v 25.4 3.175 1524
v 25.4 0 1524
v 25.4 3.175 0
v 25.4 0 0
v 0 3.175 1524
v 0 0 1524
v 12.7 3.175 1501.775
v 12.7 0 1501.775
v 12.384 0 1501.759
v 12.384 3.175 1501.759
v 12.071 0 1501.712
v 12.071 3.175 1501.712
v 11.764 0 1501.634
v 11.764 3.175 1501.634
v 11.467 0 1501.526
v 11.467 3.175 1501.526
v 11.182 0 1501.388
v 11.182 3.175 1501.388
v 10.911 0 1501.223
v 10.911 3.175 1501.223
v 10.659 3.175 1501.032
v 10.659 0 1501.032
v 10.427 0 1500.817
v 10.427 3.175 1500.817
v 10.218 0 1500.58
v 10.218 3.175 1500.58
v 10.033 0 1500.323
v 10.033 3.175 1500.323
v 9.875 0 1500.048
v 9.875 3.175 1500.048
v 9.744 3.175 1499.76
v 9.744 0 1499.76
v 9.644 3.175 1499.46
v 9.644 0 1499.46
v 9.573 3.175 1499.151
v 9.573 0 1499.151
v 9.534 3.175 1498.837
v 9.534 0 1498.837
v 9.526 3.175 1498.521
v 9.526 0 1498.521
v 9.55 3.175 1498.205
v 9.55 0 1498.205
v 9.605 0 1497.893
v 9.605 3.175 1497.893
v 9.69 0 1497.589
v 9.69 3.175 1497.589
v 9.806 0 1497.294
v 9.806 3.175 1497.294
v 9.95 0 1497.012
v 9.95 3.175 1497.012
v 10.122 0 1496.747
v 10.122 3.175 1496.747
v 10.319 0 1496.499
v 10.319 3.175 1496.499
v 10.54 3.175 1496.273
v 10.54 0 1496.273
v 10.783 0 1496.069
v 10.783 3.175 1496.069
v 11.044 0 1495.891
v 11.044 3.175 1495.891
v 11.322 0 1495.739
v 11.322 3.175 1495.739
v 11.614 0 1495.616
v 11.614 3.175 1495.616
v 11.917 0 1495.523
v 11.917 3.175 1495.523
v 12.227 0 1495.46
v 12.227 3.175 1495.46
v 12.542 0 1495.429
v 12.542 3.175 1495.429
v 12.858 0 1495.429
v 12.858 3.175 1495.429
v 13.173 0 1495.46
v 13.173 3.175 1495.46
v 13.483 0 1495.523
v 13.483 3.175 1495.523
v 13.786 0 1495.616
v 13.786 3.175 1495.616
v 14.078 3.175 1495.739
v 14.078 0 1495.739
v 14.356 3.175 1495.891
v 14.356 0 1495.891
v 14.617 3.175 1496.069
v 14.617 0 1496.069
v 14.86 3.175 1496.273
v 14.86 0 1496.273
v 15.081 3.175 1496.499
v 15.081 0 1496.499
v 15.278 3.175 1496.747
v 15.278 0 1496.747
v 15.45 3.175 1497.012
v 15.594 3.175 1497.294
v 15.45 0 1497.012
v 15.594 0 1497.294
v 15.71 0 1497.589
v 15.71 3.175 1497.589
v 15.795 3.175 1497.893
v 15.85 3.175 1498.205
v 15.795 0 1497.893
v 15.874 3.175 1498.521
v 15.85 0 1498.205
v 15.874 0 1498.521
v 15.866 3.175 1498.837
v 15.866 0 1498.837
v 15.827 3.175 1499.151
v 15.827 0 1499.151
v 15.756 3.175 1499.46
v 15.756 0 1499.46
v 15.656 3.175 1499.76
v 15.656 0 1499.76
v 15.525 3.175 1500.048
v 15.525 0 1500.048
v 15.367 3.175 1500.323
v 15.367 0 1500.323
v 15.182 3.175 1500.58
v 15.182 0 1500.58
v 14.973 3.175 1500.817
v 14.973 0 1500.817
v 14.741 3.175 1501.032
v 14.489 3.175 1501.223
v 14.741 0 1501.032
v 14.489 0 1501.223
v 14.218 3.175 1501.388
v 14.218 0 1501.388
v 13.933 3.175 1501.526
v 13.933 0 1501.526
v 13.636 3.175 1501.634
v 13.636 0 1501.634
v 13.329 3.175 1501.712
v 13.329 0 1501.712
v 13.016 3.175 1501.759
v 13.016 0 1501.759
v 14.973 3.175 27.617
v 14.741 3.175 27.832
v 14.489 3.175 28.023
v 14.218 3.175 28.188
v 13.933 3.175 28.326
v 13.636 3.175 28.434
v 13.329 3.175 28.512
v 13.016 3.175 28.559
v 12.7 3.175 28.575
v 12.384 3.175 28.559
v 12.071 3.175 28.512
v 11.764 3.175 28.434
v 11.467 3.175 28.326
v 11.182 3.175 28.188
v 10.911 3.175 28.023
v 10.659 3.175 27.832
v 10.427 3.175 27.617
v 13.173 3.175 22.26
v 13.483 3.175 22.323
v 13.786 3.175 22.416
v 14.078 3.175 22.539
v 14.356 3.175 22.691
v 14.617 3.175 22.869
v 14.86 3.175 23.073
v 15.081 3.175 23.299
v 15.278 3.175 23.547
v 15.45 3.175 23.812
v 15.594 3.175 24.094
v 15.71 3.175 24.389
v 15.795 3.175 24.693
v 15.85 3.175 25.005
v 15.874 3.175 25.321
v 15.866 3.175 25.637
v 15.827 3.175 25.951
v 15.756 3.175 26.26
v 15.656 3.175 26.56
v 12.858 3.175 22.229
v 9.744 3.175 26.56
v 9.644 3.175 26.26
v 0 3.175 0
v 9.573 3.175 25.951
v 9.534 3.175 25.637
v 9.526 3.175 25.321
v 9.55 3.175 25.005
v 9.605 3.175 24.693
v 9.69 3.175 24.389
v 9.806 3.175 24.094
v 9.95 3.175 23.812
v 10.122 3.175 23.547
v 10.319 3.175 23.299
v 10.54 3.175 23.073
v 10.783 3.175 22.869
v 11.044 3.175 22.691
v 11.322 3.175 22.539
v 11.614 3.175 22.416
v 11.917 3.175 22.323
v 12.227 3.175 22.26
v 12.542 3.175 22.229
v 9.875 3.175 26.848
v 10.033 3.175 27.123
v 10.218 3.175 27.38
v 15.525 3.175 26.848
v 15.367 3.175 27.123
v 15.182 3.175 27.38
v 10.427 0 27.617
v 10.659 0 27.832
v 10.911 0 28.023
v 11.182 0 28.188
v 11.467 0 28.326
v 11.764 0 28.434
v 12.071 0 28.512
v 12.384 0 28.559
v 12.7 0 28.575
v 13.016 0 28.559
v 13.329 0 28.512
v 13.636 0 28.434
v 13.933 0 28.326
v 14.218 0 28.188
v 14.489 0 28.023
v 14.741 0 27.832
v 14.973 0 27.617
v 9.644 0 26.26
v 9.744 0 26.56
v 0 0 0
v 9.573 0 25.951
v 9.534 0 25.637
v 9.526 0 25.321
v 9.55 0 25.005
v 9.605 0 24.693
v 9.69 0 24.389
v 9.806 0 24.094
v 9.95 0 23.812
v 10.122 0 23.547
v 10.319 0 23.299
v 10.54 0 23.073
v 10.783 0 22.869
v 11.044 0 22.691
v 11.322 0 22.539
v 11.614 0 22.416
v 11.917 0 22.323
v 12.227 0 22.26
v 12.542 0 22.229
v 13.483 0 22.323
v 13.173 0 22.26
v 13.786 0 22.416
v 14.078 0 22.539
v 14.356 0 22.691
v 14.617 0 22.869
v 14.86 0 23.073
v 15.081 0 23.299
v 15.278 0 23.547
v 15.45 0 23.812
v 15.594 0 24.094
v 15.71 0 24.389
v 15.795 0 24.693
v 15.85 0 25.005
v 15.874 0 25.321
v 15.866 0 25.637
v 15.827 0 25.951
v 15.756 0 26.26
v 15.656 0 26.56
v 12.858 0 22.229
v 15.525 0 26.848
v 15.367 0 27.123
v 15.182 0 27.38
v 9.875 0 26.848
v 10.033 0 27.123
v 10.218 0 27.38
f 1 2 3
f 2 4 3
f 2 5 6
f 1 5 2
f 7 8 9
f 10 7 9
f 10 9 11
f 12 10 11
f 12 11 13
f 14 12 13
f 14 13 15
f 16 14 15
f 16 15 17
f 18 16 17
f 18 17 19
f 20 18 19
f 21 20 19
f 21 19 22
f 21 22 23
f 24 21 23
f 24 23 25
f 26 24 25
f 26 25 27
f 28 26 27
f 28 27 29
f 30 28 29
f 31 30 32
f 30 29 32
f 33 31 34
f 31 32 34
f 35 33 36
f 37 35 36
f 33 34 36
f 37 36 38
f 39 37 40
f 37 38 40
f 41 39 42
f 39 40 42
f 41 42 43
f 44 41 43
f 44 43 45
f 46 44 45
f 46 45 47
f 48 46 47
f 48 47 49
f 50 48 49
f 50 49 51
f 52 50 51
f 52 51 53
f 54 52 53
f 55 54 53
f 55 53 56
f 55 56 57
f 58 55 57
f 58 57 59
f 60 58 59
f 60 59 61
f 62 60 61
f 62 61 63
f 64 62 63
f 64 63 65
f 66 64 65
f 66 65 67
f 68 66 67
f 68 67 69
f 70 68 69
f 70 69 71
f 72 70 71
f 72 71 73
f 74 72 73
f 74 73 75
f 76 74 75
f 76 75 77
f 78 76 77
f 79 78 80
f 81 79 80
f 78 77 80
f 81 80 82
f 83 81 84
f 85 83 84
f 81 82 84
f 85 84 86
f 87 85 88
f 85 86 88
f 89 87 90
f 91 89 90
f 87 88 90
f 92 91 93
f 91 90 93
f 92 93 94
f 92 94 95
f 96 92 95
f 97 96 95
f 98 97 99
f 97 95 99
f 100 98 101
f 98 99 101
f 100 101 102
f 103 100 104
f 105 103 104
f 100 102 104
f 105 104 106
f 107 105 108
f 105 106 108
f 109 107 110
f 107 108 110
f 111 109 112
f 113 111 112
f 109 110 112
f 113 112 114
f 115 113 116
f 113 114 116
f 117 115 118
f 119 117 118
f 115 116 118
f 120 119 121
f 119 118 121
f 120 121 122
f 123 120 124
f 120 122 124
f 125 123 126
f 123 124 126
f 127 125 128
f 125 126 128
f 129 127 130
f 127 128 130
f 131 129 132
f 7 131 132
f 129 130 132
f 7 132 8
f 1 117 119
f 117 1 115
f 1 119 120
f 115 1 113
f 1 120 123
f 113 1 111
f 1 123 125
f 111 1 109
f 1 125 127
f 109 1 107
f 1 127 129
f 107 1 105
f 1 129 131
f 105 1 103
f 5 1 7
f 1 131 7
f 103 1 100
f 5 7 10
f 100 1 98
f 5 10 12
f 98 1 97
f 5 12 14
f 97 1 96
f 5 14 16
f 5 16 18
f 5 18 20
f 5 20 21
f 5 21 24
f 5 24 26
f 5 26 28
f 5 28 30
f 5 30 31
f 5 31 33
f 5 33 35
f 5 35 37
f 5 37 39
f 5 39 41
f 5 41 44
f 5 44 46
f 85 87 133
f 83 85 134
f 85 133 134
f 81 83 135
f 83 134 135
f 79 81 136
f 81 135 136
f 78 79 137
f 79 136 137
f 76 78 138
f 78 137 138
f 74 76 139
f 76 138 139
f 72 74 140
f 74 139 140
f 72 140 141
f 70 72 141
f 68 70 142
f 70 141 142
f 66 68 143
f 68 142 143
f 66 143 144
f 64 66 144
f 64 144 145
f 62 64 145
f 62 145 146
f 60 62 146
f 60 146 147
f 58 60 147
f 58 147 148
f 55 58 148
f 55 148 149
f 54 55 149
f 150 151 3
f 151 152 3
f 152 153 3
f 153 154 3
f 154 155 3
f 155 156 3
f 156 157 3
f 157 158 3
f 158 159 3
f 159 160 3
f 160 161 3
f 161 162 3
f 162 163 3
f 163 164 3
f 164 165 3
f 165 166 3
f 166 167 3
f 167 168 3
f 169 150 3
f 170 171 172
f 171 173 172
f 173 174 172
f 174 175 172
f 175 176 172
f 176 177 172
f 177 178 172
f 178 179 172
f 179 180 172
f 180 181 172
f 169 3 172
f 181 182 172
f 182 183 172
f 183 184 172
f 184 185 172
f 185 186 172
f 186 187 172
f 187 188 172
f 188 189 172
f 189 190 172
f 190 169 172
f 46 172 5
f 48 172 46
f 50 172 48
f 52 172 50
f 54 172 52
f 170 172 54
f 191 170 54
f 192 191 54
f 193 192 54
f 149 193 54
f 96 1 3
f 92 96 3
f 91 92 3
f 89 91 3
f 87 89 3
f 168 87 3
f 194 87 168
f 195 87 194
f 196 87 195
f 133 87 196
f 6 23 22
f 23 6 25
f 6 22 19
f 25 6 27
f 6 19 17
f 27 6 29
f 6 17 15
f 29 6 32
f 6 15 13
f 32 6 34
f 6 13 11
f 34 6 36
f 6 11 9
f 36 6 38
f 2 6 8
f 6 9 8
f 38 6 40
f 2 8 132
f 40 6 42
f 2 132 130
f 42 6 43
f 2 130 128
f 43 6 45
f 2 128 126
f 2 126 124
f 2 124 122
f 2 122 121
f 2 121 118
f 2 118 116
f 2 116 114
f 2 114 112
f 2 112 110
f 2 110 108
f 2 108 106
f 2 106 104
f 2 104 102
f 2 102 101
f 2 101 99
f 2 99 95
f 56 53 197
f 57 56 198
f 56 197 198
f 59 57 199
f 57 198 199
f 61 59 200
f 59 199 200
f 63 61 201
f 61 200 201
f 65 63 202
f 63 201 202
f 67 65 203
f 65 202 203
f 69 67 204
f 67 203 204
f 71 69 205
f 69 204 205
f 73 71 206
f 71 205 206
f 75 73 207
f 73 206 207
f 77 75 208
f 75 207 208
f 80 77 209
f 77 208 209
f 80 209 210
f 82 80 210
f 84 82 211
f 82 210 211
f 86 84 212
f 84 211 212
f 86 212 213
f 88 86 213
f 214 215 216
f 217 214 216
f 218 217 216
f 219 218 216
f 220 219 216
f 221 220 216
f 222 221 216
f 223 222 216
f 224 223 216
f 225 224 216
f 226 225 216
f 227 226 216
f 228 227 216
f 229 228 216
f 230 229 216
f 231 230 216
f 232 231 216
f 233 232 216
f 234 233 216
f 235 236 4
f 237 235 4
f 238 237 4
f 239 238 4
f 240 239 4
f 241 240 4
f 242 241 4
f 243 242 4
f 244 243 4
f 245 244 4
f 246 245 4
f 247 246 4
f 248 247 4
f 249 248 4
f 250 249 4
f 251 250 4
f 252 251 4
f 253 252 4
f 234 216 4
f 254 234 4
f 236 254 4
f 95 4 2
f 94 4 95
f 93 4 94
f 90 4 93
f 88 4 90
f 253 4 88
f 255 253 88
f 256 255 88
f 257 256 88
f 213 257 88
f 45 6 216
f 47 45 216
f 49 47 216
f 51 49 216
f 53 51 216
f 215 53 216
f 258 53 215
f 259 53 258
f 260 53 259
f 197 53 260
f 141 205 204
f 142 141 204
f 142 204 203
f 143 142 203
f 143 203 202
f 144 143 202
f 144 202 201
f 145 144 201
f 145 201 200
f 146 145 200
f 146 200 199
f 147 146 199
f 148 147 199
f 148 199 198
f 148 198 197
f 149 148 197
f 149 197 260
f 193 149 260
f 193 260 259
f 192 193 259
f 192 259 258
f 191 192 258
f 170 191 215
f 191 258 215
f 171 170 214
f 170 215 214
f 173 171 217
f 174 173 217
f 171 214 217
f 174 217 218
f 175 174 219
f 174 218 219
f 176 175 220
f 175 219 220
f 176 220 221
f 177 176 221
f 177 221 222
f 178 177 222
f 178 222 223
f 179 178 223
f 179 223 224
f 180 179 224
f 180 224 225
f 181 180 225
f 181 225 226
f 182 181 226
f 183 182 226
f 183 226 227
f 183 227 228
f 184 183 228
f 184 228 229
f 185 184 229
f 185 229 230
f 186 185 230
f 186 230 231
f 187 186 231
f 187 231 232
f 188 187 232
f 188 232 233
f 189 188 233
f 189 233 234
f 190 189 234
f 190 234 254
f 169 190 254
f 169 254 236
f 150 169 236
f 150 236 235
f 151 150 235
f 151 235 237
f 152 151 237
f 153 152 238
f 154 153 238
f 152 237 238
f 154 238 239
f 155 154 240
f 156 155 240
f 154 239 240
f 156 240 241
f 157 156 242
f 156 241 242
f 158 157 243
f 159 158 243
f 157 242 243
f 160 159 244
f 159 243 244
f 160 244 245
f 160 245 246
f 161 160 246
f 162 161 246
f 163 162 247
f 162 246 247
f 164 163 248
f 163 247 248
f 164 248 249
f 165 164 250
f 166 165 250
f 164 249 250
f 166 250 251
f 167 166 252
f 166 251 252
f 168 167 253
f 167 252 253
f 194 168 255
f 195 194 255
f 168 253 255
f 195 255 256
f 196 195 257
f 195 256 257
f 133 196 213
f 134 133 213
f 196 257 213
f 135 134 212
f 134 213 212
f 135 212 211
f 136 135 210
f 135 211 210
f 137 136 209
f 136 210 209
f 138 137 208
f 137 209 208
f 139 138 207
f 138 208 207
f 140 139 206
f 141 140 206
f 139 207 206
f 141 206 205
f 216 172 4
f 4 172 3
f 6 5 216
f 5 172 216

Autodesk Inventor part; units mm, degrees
ref_plane "YZ Plane" through (0, 0, 0) normal (1, 0, 0) x (0, 1, 0)
ref_plane "XZ Plane" through (0, 0, 0) normal (0, 1, 0) x (-1, 0, 0)
ref_plane "XY Plane" through (0, 0, 0) normal (0, 0, 1) x (1, 0, 0)
sketch "Sketch1" plane through (0, 0, 0) normal (0, 0, 1) x (1, 0, 0)
  line L0 (0, 0) -> (25.4, 0)
  line L1 (25.4, 0) -> (25.4, 3.175)
  line L2 (25.4, 3.175) -> (0, 3.175)
  line L3 (0, 3.175) -> (0, 0)
  dimension "d0" = 25.4
  dimension "d1" = 3.175
extrude "Extrusion1" add sketch "Sketch1" along normal blind 1524
sketch "Sketch2" plane through (0, 3.175, 1524) normal (0, 1, 0) x (1, 0, 0)
  line L0 (25.4, 1524) -> (0, 1524) projected
  line L1 (0, 1524) -> (0, 0) projected
  line L2 (25.4, 0) -> (0, 0) projected
  line L3 (25.4, 1524) -> (25.4, 0) projected
  point P0 (12.7, 1498.6)
  point P1 (12.7, 25.4)
  dimension "d4" = 12.7
  dimension "d5" = 25.4
  dimension "d6" = 12.7
  dimension "d7" = 25.4
hole "Hole1" at (12.7, 3.175, 25.4) at (12.7, 3.175, 1498.6) direction (0, -1, 0) diameter 6.35 end through all
properties part number "rail aligner"
